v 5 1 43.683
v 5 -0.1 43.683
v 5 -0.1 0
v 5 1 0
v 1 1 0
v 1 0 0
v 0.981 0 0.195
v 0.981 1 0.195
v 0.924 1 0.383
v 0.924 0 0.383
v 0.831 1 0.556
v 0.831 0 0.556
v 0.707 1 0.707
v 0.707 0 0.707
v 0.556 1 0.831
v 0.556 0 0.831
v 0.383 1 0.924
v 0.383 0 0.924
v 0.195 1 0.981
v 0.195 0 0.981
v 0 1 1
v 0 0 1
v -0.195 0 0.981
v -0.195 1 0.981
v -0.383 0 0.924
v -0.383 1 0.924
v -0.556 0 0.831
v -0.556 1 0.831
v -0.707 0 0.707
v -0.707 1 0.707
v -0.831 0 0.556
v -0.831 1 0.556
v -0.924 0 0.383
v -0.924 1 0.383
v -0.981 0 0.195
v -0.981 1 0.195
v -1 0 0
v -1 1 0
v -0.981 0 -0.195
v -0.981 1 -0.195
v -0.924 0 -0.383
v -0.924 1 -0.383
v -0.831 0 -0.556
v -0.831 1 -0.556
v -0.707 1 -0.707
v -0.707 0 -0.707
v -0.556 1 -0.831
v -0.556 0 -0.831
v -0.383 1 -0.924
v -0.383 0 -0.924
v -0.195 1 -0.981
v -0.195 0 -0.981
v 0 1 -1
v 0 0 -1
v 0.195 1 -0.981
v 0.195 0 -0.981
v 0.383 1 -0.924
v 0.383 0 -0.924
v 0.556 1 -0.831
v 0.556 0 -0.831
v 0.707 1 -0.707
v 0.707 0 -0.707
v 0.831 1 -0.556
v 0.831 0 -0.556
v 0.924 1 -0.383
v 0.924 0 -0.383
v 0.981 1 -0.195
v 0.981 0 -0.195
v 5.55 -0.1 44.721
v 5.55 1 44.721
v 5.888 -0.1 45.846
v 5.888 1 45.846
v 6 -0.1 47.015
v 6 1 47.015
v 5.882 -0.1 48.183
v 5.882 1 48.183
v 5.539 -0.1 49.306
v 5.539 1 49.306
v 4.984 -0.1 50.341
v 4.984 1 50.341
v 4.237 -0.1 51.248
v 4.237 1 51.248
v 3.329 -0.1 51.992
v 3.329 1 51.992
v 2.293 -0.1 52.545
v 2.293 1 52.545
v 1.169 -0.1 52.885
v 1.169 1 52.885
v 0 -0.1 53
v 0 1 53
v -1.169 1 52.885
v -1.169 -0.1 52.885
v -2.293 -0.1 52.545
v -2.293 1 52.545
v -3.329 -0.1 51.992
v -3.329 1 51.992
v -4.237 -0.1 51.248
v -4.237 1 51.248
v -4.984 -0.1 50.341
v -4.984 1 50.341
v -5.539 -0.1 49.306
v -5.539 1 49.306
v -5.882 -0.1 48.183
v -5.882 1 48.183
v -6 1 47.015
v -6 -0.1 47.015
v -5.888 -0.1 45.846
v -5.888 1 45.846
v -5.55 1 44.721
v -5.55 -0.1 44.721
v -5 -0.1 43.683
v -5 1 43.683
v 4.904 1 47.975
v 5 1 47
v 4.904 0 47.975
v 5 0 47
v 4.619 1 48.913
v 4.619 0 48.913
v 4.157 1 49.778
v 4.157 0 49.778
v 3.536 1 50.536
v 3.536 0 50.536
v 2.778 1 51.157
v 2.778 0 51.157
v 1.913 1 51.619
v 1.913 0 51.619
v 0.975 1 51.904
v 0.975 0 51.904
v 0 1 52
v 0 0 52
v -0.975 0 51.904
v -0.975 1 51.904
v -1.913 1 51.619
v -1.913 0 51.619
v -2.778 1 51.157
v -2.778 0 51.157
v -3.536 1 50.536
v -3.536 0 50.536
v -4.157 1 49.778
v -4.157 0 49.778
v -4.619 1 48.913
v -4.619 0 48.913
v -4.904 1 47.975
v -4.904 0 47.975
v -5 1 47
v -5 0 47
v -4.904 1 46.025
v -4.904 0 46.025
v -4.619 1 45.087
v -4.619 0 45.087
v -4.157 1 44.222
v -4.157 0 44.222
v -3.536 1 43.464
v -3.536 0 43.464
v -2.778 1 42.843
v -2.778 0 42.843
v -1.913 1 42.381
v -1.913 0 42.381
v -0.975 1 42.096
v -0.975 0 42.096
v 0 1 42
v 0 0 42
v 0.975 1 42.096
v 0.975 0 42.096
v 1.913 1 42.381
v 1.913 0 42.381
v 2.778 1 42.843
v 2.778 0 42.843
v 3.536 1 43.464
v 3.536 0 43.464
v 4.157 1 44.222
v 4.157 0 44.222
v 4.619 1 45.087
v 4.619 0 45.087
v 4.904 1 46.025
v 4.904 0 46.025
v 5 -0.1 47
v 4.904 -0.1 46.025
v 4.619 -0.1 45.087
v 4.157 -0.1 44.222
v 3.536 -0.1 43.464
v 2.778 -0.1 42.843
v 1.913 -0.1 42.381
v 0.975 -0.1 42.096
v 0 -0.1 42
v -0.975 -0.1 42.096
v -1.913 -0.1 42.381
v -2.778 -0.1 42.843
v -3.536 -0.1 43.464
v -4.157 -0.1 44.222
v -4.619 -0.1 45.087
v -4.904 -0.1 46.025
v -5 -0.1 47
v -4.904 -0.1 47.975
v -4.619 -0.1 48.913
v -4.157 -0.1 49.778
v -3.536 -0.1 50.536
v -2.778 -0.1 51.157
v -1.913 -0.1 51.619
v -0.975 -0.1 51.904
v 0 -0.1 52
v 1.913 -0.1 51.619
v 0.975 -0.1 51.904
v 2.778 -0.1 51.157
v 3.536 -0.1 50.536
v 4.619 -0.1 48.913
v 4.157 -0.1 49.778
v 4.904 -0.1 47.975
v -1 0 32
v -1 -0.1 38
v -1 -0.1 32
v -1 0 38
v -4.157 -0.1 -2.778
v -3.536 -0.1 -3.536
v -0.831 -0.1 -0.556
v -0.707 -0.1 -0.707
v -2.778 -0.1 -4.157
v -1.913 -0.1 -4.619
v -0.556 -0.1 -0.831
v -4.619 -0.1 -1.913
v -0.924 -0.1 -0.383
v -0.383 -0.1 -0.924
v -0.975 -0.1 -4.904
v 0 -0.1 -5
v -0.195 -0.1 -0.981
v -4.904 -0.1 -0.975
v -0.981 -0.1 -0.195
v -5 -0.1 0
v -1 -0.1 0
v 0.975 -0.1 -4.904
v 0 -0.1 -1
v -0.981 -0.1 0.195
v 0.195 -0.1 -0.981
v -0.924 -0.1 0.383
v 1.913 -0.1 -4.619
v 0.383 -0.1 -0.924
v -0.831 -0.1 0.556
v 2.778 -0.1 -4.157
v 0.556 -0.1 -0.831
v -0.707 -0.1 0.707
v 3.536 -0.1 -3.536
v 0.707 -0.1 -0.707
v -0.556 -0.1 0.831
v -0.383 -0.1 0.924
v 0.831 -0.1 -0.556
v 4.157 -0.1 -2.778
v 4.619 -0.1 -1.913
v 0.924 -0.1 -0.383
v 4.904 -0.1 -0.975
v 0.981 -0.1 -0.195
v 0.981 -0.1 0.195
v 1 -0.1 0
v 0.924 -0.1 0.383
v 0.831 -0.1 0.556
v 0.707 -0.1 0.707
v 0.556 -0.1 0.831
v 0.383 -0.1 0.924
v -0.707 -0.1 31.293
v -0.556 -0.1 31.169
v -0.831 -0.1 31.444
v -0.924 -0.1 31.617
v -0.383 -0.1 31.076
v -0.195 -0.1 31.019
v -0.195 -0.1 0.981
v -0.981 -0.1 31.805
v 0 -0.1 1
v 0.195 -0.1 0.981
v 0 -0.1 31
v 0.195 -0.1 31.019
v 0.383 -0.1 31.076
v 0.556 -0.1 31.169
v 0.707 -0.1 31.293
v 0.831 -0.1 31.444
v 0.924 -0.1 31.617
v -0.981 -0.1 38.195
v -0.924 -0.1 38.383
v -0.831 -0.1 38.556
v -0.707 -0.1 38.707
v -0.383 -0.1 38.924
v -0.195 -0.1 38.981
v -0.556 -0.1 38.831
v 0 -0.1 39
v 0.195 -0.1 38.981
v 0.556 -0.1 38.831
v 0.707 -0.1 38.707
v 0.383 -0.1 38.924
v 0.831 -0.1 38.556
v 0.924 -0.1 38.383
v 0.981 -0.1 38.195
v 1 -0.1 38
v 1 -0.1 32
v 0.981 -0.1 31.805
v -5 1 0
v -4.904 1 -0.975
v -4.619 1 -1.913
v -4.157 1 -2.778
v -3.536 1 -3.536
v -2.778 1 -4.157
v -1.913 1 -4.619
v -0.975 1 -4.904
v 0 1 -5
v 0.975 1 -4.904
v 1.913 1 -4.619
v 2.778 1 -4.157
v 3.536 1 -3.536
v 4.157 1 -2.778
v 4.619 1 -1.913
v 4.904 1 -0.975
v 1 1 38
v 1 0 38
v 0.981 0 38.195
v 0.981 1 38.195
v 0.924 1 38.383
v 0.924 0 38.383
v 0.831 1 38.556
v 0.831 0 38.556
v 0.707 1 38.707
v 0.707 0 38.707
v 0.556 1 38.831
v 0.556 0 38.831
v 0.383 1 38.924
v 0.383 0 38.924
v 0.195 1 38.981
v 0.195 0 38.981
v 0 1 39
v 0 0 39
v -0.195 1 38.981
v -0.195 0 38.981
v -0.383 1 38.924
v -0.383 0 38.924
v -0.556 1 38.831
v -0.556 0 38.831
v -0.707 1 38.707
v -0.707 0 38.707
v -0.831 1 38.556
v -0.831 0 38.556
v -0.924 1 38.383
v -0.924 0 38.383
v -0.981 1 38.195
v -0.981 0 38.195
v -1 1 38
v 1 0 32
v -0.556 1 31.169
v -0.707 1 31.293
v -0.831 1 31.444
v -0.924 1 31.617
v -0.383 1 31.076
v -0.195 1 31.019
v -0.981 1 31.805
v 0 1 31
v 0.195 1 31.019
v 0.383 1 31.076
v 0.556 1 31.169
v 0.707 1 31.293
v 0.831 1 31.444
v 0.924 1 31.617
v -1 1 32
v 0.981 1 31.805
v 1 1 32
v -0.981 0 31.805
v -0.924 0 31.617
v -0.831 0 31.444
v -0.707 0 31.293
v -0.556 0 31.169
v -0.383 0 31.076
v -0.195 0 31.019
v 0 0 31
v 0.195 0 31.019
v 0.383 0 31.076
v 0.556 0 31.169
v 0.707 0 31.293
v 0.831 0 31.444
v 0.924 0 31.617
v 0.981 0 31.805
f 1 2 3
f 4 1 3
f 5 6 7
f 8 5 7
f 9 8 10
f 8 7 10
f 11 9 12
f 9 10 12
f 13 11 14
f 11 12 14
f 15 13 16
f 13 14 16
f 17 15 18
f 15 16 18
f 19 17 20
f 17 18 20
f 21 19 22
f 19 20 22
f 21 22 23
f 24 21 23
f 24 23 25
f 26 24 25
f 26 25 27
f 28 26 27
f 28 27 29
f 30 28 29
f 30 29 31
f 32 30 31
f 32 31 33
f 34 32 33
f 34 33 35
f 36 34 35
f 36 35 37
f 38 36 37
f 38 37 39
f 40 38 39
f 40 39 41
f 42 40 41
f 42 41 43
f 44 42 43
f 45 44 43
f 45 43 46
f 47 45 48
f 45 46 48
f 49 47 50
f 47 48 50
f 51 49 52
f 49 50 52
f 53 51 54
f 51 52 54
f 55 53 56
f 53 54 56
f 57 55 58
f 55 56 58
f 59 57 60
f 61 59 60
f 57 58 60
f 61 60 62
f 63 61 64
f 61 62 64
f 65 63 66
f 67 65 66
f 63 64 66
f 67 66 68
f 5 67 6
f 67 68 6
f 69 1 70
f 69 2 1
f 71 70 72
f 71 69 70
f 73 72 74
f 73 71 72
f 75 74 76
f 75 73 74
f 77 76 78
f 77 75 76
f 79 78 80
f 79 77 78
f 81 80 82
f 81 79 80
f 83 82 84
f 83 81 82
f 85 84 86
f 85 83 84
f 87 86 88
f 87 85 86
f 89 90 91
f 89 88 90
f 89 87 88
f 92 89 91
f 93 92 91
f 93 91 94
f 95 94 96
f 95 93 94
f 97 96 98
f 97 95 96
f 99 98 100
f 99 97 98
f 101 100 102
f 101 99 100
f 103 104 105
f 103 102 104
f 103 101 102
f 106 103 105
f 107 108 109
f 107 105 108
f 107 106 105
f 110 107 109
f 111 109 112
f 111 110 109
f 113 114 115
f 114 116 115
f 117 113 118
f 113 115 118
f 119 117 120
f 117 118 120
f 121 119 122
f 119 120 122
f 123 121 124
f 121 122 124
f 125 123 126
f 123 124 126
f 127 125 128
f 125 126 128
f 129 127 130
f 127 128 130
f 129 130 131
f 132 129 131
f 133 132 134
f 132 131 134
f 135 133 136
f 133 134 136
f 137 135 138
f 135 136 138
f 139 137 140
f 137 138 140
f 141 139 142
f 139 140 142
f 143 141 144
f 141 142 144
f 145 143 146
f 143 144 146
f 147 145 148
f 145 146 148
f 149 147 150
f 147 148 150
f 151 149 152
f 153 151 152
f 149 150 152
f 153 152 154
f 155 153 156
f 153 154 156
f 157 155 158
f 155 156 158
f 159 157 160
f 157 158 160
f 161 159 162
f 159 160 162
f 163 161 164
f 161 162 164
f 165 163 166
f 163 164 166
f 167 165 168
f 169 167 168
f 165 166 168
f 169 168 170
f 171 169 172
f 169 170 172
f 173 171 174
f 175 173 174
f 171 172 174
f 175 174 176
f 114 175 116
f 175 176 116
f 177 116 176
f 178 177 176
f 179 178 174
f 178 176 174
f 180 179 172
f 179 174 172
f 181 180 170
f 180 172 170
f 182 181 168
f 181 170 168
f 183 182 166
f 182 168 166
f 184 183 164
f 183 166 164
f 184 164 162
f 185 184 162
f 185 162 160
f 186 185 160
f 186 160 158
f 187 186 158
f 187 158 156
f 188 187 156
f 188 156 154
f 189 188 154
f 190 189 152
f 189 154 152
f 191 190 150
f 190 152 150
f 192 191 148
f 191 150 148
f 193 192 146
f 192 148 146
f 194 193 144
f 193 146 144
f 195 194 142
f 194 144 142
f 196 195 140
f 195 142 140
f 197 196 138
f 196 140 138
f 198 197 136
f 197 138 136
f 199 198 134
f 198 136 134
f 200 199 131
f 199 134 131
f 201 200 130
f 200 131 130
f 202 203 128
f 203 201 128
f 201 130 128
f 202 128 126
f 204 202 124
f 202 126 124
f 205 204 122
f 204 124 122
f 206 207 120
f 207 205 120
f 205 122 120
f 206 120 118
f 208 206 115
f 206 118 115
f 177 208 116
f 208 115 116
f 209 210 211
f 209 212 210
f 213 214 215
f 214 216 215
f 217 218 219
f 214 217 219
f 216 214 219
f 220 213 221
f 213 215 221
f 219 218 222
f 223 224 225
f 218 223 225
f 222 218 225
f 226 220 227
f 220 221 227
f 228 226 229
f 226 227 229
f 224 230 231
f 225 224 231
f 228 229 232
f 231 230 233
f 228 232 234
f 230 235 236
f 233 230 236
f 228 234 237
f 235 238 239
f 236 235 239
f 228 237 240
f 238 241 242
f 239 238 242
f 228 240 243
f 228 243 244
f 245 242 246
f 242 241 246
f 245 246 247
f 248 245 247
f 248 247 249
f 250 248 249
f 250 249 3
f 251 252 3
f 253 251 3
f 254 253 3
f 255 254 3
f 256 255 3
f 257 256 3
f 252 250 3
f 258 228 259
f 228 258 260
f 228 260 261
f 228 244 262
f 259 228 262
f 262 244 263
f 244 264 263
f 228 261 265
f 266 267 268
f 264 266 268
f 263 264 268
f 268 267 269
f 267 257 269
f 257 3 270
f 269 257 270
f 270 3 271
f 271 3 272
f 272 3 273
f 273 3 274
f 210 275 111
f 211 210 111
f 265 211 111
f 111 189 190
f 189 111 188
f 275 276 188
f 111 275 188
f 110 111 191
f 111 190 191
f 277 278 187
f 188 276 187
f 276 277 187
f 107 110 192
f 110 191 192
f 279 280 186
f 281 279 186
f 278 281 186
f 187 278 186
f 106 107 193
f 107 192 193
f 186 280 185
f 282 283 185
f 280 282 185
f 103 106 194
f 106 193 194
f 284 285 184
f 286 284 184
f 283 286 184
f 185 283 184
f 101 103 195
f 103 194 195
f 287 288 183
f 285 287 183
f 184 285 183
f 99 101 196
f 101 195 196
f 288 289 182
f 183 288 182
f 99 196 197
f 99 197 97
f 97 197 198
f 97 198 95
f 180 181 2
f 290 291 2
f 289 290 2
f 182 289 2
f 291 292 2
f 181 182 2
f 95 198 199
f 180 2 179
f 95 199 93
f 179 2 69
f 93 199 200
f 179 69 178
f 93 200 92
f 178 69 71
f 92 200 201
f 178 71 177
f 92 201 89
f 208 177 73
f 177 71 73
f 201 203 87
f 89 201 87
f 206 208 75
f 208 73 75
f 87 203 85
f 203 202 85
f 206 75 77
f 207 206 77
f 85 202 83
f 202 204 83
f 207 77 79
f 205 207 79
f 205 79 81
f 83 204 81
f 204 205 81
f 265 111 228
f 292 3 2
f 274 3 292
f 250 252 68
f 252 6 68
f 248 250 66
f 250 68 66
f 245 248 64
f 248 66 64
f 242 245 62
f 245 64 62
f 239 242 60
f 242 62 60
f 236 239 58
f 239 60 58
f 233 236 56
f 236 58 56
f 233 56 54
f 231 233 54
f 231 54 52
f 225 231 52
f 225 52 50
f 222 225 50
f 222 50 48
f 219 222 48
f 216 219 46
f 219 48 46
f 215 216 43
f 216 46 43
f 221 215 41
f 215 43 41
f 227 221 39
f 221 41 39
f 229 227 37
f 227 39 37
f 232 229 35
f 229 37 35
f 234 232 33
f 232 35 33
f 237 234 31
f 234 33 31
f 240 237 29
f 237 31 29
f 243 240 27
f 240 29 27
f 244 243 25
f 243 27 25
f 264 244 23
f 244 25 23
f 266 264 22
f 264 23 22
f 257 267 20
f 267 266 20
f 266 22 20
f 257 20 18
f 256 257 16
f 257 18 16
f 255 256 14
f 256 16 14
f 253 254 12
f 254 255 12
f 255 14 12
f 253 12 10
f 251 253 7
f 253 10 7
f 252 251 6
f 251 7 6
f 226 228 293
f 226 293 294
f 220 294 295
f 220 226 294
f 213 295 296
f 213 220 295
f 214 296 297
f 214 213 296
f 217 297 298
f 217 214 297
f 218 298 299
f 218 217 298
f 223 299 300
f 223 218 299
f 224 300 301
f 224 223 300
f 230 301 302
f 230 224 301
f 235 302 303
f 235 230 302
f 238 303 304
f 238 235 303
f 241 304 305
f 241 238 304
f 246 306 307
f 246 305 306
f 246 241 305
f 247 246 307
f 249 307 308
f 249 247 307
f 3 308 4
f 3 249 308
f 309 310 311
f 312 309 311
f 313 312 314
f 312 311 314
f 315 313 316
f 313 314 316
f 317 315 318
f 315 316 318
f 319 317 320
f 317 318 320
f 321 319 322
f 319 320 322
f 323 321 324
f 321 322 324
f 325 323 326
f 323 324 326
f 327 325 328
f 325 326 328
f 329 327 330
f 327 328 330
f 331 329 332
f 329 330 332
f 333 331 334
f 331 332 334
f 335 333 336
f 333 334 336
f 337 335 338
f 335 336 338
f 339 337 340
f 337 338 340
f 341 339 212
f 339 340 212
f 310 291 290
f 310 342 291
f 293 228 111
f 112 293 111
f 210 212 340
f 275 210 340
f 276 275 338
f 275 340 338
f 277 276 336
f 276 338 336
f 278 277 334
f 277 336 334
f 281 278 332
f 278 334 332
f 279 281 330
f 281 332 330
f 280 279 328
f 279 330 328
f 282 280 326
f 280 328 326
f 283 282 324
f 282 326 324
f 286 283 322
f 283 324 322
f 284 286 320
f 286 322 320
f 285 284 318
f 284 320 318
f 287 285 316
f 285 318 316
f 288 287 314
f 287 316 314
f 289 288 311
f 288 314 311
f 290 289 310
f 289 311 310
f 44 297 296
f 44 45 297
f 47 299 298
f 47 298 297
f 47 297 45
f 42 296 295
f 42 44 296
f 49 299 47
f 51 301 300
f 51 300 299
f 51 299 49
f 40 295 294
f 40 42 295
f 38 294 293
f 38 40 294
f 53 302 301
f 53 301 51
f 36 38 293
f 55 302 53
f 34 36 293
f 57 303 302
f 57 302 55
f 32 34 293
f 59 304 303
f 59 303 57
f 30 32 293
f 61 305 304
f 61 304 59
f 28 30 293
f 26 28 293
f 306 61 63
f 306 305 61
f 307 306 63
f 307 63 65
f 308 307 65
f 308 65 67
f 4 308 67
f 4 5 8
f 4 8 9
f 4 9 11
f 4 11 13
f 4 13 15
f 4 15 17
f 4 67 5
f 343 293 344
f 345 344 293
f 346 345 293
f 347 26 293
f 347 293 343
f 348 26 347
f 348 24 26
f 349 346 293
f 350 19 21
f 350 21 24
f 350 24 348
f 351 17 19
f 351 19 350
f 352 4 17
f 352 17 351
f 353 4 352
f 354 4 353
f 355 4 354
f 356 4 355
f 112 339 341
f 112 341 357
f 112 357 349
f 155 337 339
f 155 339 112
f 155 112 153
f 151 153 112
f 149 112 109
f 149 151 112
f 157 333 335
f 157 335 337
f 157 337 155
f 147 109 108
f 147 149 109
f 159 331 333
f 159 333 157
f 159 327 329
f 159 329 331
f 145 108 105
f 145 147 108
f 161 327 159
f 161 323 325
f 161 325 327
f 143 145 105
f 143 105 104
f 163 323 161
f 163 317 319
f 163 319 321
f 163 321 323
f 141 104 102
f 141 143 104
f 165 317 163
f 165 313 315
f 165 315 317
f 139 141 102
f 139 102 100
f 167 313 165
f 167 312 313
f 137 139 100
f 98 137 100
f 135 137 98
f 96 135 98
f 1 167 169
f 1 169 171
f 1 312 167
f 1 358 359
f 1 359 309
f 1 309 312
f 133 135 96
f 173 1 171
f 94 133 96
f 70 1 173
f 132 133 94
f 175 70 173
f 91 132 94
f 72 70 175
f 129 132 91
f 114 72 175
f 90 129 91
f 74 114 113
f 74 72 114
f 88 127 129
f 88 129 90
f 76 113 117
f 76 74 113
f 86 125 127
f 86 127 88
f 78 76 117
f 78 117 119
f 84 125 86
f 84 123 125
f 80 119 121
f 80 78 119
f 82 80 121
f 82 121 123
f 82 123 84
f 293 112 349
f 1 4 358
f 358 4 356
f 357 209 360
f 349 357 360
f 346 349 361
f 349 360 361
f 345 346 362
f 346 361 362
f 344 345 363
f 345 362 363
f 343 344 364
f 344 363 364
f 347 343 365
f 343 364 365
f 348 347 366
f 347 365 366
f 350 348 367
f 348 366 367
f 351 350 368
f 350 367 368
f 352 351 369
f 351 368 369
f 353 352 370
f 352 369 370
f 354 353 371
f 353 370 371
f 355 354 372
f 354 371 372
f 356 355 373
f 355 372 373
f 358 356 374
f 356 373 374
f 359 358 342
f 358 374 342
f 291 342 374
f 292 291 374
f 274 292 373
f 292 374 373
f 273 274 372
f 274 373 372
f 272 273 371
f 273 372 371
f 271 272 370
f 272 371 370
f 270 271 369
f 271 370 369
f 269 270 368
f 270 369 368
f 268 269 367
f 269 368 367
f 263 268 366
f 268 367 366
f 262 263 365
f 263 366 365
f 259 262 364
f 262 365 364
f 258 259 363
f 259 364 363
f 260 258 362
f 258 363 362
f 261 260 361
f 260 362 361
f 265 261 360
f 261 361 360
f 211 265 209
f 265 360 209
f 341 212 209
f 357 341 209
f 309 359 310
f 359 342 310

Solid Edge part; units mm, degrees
sketch "Sketch1" plane through (0, 0, 0) normal (0, -1, 0) x (1, 0, 0)
  circle A0 centre (0, 0) radius 1
  circle A1 centre (0, 47) radius 5
  line L0 (5, 43.6834) -> (5, 0)
  arc A2 (-5, 43.6834) -> (5, 43.6834) centre (0, 47) cw
  line L1 (-5, 0) -> (-5, 43.6834)
  arc A3 (5, 0) -> (-5, 0) centre (0, 0) cw
  line L2 (1, 32) -> (1, 38)
  arc A4 (-1, 32) -> (1, 32) centre (0, 32) ccw
  line L3 (-1, 38) -> (-1, 32)
  arc A5 (1, 38) -> (-1, 38) centre (0, 38) ccw
extrude "Extrusionsausprägung_1" add sketch "Sketch1" against normal blind 1 and the other way blind 0.1
